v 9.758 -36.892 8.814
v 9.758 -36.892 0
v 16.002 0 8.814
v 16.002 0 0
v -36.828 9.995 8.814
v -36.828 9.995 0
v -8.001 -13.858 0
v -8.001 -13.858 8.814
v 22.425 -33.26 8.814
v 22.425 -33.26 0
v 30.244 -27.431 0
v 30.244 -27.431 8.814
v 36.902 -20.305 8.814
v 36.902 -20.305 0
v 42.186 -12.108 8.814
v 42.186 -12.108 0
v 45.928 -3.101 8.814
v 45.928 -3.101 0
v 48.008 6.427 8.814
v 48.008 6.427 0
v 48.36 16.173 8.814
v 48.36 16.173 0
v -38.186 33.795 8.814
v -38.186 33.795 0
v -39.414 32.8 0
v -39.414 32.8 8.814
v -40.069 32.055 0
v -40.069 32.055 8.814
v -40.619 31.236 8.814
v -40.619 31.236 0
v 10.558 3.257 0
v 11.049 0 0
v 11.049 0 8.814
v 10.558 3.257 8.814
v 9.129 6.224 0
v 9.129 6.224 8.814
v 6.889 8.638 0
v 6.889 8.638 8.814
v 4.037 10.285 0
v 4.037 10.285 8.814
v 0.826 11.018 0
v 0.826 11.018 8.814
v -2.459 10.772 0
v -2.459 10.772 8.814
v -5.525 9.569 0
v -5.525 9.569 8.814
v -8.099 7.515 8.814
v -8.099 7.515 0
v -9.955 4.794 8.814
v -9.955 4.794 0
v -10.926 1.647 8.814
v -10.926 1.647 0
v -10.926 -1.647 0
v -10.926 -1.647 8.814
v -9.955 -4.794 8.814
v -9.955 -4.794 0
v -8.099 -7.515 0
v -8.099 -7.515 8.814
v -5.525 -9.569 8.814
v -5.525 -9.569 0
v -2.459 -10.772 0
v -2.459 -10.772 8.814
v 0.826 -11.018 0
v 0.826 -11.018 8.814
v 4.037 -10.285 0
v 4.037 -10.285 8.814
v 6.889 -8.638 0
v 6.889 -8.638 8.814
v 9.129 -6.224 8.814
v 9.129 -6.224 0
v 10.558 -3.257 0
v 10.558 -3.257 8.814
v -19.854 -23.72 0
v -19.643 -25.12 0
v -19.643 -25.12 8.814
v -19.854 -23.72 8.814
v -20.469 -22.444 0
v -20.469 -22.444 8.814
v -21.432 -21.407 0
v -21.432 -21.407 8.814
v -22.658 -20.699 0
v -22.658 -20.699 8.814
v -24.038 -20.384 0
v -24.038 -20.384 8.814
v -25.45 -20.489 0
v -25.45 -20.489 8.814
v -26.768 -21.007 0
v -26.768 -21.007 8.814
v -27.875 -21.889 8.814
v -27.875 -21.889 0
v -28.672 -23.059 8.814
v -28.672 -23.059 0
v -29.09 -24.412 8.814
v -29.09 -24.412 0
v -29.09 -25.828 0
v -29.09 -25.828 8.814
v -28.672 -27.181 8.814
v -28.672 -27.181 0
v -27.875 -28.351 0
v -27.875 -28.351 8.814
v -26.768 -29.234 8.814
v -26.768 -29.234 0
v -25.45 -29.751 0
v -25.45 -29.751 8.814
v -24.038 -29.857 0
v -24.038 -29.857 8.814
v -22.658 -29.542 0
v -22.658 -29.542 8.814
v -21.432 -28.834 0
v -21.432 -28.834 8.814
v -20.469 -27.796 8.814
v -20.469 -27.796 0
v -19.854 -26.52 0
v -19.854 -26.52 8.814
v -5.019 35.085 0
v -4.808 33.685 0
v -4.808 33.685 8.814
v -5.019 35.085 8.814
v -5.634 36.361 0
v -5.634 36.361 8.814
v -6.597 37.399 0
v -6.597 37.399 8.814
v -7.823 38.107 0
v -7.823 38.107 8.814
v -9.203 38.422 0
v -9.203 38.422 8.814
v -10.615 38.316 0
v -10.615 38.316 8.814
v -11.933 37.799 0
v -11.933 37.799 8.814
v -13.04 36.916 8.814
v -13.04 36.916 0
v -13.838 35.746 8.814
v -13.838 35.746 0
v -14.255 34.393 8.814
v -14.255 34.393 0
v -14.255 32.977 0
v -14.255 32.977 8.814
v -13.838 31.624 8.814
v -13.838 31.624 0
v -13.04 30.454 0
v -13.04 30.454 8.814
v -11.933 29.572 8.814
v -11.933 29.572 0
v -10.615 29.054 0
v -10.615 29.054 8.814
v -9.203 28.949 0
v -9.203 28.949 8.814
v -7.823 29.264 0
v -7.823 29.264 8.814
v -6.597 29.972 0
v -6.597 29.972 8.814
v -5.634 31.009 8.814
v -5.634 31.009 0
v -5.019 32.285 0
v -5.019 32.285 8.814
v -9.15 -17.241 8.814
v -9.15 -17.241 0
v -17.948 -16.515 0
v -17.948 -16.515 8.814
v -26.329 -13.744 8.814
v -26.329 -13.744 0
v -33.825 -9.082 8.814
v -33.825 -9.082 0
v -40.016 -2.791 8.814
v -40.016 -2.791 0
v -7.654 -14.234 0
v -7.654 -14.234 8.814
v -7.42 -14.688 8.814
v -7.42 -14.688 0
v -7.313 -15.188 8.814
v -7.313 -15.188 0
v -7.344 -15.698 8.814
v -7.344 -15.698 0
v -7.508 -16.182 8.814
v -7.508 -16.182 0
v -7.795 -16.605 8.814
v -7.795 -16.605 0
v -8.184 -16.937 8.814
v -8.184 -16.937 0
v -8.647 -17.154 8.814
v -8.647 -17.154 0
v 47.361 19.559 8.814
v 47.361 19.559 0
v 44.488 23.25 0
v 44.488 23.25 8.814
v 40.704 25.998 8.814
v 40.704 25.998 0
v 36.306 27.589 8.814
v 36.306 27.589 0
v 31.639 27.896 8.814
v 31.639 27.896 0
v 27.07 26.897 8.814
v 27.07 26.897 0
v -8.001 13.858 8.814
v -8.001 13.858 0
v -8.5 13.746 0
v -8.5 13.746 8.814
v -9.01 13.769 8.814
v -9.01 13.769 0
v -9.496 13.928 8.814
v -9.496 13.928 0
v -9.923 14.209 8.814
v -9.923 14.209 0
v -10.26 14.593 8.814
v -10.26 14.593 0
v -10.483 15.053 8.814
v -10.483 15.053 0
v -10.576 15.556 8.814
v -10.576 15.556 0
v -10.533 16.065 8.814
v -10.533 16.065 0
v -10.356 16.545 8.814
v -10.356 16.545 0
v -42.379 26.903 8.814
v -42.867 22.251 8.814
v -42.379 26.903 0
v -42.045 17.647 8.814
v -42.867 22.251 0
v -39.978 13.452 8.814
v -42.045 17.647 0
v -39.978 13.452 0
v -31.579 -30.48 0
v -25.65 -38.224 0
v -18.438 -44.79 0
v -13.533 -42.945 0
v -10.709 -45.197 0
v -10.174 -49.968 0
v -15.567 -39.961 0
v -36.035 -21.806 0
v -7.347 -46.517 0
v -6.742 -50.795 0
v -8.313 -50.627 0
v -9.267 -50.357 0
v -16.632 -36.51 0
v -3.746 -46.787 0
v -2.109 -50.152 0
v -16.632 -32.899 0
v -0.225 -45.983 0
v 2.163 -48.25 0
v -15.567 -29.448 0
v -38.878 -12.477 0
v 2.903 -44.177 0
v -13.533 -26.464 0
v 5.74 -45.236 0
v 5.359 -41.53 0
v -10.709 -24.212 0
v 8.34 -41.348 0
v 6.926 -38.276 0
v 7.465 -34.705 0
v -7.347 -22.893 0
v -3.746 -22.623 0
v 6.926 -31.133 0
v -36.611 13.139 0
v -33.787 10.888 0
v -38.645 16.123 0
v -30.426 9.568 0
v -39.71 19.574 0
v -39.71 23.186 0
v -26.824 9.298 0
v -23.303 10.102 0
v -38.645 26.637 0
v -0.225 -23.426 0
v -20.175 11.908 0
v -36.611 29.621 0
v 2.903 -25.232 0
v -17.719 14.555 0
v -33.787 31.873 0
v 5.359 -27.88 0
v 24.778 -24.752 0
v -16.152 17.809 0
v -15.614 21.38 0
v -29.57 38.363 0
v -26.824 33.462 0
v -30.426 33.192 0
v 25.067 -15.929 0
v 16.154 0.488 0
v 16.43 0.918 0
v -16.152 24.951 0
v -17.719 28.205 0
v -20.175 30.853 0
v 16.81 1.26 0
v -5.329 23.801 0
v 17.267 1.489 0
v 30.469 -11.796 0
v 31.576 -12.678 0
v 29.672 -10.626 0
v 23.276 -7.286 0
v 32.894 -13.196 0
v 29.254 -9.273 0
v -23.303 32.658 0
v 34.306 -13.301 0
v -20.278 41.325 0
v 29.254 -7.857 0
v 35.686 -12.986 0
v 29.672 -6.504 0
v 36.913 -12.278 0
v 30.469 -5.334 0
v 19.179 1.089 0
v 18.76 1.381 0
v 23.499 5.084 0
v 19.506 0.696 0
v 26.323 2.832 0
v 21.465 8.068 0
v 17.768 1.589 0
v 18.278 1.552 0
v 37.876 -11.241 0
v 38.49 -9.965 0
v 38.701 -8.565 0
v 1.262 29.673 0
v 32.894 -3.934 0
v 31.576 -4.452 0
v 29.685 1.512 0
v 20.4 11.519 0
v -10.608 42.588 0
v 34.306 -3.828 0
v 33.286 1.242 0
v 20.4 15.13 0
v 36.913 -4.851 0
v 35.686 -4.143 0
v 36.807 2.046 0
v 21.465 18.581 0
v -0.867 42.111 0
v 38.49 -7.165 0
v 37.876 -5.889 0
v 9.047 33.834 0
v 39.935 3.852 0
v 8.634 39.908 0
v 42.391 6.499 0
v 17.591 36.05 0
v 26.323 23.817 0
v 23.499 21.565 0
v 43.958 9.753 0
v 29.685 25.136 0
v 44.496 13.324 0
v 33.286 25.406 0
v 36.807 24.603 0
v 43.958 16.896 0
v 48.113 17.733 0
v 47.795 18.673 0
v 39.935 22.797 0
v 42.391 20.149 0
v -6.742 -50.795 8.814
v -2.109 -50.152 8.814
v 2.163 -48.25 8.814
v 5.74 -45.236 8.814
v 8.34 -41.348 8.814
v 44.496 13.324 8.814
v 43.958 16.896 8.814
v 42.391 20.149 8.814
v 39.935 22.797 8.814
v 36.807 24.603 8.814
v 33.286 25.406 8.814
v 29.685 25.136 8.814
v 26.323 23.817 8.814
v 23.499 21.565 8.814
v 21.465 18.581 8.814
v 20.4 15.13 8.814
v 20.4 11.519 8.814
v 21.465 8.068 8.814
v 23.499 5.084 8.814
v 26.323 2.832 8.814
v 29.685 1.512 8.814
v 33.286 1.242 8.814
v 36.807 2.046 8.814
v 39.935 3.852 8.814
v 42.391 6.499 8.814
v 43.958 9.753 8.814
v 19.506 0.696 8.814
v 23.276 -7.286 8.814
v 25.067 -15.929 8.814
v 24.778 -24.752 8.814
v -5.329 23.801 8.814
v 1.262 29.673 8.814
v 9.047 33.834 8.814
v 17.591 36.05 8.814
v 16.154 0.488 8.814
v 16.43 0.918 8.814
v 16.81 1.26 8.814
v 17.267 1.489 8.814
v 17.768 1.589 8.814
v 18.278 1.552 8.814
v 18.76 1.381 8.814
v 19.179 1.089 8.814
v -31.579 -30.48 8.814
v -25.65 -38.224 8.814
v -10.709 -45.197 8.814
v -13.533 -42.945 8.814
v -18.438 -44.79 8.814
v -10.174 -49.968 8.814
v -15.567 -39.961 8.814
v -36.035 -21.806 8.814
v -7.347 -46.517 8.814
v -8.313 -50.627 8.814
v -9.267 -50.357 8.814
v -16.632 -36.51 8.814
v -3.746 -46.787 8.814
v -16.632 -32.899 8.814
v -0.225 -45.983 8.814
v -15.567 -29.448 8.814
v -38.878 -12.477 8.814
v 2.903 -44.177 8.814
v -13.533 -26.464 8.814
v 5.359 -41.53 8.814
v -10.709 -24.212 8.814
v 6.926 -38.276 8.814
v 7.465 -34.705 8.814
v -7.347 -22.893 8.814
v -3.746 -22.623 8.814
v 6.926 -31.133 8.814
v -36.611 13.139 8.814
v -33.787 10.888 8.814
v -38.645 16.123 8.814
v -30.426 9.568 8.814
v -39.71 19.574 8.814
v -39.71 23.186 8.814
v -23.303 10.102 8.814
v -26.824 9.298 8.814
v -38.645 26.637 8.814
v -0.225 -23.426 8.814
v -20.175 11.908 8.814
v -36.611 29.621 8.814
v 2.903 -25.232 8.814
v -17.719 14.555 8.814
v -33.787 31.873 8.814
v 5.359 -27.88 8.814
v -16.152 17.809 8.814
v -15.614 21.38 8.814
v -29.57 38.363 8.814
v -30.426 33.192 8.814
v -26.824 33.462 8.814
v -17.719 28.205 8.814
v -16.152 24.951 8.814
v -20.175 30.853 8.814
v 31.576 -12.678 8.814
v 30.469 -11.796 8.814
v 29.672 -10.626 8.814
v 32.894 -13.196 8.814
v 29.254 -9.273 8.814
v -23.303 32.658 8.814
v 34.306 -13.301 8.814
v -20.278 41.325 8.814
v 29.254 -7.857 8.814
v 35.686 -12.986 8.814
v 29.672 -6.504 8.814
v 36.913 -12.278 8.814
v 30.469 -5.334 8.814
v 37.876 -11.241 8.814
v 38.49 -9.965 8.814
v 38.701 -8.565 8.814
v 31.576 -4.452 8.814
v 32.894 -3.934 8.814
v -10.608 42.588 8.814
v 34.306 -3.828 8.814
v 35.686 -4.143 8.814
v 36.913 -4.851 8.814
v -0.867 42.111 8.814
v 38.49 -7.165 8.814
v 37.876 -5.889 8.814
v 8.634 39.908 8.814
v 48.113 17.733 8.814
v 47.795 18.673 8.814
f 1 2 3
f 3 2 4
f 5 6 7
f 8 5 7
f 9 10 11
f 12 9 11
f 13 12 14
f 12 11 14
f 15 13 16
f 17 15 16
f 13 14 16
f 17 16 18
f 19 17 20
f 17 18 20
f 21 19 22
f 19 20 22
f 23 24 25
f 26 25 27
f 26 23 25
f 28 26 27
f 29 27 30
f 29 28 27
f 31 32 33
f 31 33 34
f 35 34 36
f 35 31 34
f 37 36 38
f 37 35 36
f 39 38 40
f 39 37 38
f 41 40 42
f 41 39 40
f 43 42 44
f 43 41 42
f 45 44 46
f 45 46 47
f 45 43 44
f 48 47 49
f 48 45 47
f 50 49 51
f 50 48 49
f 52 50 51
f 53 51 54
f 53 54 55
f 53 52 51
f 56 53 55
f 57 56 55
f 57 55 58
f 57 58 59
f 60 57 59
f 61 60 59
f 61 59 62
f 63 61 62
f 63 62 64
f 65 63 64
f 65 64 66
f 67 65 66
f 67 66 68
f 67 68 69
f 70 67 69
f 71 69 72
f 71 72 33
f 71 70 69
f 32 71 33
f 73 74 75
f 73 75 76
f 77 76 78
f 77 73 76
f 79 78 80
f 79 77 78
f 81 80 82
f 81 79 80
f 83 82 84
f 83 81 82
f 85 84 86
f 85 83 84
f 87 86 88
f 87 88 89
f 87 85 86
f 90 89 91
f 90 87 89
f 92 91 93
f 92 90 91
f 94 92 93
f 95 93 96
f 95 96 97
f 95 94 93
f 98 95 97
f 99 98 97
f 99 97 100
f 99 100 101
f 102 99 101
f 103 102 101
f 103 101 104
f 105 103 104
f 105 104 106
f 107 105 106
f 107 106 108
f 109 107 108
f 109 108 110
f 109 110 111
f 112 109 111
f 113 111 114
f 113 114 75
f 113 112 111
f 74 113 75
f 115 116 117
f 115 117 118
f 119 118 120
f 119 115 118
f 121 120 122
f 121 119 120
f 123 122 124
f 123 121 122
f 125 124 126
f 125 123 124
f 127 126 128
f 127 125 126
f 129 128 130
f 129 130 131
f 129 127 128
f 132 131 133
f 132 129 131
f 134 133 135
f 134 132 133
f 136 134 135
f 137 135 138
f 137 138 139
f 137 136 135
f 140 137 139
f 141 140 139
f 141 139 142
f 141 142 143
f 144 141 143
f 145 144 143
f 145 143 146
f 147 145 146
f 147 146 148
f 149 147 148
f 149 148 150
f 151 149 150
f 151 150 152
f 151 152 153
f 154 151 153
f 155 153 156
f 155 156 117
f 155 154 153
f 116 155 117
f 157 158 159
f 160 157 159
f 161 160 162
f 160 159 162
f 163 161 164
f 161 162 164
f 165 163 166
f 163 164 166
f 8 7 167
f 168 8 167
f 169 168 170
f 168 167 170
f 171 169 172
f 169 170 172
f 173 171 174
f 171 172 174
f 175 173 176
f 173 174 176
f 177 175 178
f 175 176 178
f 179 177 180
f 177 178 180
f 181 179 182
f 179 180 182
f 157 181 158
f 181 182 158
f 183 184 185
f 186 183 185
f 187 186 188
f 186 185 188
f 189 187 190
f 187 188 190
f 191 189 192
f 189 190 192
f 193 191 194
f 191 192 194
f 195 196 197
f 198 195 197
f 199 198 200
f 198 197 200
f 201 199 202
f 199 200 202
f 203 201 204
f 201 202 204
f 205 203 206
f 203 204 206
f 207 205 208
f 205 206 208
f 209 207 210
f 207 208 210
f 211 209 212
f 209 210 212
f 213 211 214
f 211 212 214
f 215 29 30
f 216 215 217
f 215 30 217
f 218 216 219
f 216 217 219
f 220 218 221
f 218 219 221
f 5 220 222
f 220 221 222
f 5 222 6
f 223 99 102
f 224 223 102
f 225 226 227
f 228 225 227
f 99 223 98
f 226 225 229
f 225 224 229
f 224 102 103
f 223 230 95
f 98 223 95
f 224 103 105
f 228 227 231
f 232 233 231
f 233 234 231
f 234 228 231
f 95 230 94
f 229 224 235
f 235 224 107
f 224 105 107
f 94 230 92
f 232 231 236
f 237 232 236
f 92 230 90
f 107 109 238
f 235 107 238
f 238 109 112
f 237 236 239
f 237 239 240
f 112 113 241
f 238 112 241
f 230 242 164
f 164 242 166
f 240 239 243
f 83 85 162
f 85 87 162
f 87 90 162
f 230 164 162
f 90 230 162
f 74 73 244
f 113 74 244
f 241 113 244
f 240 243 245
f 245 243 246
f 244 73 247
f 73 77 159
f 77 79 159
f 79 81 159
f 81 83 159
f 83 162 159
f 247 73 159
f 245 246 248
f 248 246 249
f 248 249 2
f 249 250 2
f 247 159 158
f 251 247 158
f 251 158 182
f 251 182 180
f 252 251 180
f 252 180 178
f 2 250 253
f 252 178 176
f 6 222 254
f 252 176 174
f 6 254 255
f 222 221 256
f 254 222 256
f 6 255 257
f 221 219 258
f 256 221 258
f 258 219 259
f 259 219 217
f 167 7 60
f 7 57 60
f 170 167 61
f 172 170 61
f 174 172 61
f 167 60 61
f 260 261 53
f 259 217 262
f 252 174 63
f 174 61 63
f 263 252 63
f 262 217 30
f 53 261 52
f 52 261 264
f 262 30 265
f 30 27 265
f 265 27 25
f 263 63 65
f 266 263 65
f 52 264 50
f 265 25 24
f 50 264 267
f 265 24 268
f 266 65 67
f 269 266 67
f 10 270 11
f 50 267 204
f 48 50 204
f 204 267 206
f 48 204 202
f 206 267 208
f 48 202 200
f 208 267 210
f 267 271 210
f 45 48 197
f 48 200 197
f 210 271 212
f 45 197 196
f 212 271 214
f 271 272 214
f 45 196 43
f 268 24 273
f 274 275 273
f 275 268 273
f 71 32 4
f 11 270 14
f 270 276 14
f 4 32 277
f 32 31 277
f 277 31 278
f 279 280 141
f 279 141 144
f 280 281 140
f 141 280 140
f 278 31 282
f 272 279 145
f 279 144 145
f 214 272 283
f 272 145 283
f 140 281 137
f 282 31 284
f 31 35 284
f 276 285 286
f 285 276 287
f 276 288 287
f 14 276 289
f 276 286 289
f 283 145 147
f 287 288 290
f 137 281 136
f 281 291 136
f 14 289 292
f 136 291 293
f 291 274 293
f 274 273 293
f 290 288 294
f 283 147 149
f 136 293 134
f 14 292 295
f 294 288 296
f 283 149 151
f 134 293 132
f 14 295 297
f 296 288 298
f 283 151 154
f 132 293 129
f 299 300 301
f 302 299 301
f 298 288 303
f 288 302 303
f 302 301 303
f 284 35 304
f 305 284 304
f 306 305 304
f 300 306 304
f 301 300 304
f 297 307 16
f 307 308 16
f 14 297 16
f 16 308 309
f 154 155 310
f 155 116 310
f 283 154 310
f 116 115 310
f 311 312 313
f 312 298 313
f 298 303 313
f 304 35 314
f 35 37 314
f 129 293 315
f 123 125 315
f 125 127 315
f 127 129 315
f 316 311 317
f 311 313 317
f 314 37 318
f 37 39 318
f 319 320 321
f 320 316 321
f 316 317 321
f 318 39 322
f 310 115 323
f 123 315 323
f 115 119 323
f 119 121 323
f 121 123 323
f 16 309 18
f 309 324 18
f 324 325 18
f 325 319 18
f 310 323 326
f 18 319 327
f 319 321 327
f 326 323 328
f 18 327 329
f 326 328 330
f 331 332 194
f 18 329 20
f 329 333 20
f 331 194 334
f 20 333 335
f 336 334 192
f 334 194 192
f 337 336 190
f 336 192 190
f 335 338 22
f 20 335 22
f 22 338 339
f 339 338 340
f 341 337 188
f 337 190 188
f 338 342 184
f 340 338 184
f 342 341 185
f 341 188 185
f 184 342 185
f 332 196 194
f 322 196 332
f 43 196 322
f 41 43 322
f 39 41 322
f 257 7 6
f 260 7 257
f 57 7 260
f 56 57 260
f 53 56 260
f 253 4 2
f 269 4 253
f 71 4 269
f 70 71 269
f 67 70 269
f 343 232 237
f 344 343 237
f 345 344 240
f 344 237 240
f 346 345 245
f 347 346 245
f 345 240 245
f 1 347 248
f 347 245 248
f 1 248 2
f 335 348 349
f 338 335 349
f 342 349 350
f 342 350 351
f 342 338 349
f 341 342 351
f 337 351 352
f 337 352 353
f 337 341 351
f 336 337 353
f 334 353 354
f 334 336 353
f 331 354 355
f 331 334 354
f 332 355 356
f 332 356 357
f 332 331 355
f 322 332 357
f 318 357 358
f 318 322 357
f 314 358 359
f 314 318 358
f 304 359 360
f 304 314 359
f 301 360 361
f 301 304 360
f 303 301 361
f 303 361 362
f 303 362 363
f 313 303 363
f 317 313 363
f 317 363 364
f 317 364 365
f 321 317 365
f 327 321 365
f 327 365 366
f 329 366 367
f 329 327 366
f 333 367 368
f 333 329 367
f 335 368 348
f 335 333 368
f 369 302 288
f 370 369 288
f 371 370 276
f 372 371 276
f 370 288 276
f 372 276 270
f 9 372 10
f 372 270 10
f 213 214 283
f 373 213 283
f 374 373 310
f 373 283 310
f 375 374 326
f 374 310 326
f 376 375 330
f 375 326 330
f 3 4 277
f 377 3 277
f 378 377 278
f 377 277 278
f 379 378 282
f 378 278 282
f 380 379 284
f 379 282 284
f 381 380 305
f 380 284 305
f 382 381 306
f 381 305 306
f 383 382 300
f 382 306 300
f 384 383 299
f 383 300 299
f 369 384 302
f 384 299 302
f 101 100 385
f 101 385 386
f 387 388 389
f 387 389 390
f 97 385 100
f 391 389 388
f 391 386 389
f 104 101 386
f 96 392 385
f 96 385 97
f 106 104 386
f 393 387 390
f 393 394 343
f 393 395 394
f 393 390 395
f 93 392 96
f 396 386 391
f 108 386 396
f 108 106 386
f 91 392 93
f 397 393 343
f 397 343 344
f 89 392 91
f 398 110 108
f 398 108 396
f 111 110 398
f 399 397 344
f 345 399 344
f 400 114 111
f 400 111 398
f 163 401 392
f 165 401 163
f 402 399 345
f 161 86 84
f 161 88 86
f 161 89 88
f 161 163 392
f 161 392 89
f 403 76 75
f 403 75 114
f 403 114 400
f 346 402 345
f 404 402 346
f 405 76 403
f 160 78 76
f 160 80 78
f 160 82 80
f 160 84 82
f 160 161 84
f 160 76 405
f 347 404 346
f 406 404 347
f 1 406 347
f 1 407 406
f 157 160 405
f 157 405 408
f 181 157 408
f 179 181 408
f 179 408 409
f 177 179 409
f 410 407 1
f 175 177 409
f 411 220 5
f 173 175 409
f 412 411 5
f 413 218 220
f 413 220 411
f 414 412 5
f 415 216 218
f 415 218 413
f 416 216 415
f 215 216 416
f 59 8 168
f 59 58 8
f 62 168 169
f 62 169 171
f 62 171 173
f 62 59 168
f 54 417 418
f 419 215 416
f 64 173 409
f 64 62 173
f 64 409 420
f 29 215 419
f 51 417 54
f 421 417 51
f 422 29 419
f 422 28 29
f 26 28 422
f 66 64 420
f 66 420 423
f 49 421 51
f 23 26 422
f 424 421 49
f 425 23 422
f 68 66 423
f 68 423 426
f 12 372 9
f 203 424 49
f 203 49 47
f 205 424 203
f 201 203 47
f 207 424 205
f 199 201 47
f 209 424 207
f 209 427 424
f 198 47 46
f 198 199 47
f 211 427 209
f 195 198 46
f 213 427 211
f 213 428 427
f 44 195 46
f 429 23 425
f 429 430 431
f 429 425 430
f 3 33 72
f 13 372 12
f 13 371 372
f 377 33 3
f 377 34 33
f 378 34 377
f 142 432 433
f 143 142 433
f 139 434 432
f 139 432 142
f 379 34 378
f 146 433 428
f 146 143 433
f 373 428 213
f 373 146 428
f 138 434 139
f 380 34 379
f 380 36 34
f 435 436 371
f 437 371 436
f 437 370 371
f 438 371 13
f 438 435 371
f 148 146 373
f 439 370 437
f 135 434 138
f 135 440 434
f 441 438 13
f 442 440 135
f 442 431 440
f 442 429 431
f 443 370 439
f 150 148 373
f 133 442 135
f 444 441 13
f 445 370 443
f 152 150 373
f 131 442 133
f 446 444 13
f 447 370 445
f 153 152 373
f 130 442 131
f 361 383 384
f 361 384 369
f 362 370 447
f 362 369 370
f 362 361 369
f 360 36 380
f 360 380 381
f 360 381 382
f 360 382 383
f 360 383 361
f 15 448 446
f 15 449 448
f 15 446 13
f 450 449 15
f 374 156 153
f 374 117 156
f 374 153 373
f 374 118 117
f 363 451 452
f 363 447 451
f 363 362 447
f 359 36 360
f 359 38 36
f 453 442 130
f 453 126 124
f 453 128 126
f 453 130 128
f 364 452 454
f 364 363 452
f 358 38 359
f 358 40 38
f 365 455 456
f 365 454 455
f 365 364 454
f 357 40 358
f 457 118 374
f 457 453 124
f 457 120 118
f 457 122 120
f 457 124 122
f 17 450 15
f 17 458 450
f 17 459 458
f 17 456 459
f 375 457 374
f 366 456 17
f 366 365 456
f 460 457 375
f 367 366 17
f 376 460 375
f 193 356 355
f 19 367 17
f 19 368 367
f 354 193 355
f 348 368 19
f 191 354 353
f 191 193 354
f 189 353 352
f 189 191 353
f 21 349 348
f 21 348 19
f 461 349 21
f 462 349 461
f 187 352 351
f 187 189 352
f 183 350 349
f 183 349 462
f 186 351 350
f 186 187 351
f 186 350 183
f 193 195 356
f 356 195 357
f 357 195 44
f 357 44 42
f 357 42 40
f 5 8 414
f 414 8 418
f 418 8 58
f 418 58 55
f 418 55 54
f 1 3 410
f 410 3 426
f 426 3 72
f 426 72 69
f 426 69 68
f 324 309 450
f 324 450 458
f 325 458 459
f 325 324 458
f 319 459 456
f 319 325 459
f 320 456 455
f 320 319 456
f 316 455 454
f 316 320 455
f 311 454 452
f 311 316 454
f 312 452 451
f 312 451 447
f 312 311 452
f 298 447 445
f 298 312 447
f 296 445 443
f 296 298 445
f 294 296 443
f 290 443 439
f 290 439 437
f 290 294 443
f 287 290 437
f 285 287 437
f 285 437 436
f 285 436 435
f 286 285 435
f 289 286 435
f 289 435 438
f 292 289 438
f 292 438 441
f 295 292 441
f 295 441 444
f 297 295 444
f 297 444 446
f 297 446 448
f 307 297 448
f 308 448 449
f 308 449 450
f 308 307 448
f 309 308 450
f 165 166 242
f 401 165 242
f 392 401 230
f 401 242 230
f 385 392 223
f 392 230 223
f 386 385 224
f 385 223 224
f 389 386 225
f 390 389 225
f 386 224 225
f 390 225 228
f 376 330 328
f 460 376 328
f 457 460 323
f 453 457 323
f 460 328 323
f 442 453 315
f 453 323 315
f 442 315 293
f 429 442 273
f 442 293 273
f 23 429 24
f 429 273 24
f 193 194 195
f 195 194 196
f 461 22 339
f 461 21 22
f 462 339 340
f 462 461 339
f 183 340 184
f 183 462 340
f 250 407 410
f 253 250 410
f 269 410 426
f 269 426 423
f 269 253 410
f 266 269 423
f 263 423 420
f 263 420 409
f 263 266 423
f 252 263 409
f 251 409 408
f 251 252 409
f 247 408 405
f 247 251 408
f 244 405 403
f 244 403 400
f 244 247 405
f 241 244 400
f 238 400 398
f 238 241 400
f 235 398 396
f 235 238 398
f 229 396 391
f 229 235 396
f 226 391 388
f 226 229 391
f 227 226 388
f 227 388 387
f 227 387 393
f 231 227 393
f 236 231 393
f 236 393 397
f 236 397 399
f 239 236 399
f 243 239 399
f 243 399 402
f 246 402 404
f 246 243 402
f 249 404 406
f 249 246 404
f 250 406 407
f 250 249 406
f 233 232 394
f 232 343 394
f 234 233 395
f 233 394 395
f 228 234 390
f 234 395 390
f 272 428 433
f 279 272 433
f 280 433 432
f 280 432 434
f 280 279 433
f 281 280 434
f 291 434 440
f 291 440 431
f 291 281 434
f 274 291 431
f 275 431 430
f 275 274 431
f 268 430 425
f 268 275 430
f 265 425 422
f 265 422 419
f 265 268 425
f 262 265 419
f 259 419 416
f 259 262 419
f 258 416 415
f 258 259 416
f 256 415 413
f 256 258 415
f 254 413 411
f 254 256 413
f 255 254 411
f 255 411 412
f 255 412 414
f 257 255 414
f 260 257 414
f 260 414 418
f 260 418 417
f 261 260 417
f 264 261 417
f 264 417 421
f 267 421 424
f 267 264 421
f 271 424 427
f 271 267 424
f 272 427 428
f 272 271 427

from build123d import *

# Parameters (mm, degrees)
F0_R     = 12.1158
F0_R_2   = 4.7498
F0_R_3   = 11.049
F1_DEPTH = 8.8138
F2_R     = 7.62


# Not quite as in the source:
# - ends of sketch curves that miss each other by under 0.0002 mm in the source are joined


with BuildPart() as f1:
    # F0 (on Top) → F1 (new body)
    with BuildSketch(Plane.XY):
        with BuildLine():
            ThreePointArc((22.4249021167, -33.2598383611), (42.5511926564, -11.3994547245), (48.2521252698, 17.762906479))
            ThreePointArc((48.2521252698, 17.762906479), (39.4932996014, 26.5789641765), (27.0699823404, 26.8969085886))
            Line((27.0699823404, 26.8969085886), (-8.0010006819, 13.8581388051))
            ThreePointArc((-8.0010006819, 13.8581388051), (-10.1044657967, 14.3898463988), (-10.3558611613, 16.5448588871))
            ThreePointArc((-10.3558611613, 16.5448588871), (1.2618519363, 29.6731834096), (17.5914130917, 36.0504551503))
            ThreePointArc((17.5914130917, 36.0504551503), (-11.4033797439, 42.5501422233), (-39.5091916872, 32.90611409))
            ThreePointArc((-39.5091916872, 32.90611409), (-42.7647087802, 20.9127197051), (-36.8283980876, 9.9948391518))
            Line((-36.8283980876, 9.9948391518), (-8.0010006819, -13.8581382646))
            ThreePointArc((-8.0010006819, -13.8581382646), (-7.409740408, -15.9456462868), (-9.1503382861, -17.2408673032))
            ThreePointArc((-9.1503382861, -17.2408673032), (-26.3286573805, -13.743794888), (-40.0163172925, -2.7906159651))
            ThreePointArc((-40.0163172925, -2.7906159651), (-31.1478149966, -31.1506866748), (-8.7429356667, -50.669019745))
            ThreePointArc((-8.7429356667, -50.669019745), (3.2714070948, -47.4916830576), (9.7584136631, -36.8917469163))
            Line((9.7584136631, -36.8917469163), (16.0019992774, 2.702e-07))
            ThreePointArc((16.0019992774, 2.702e-07), (17.514204114, 1.5558007108), (19.5061973633, 0.6960092401))
            ThreePointArc((19.5061973633, 0.6960092401), (25.0668033601, -15.9293876975), (22.4249021167, -33.2598383611))
        make_face()
        with Locations((-4.651045185, -34.7045873419)):
            Circle(F0_R, mode=Mode.SUBTRACT)
        with Locations((-24.3930550349, -25.1201008156)):
            Circle(F0_R_2, mode=Mode.SUBTRACT)
        with Locations((33.9511726837, -8.5649542264)):
            Circle(F0_R_2, mode=Mode.SUBTRACT)
        Circle(F0_R_3, mode=Mode.SUBTRACT)
        with Locations((-27.7295329099, 21.3802167818)):
            Circle(F0_R, mode=Mode.SUBTRACT)
        with Locations((-9.5581186852, 33.6850558475)):
            Circle(F0_R_2, mode=Mode.SUBTRACT)
        with Locations((32.3805760108, 13.3243713841)):
            Circle(F0_R, mode=Mode.SUBTRACT)
    extrude(amount=F1_DEPTH)

    # F2
    f2_edges = [f1.edges().sort_by_distance(p)[0] for p in [
        (-39.509192, 32.906114, 4.4069),
        (48.252125, 17.762906, 4.4069),
        (-8.742936, -50.66902, 4.4069),
    ]]
    fillet(f2_edges, radius=F2_R)


solid = f1.part
